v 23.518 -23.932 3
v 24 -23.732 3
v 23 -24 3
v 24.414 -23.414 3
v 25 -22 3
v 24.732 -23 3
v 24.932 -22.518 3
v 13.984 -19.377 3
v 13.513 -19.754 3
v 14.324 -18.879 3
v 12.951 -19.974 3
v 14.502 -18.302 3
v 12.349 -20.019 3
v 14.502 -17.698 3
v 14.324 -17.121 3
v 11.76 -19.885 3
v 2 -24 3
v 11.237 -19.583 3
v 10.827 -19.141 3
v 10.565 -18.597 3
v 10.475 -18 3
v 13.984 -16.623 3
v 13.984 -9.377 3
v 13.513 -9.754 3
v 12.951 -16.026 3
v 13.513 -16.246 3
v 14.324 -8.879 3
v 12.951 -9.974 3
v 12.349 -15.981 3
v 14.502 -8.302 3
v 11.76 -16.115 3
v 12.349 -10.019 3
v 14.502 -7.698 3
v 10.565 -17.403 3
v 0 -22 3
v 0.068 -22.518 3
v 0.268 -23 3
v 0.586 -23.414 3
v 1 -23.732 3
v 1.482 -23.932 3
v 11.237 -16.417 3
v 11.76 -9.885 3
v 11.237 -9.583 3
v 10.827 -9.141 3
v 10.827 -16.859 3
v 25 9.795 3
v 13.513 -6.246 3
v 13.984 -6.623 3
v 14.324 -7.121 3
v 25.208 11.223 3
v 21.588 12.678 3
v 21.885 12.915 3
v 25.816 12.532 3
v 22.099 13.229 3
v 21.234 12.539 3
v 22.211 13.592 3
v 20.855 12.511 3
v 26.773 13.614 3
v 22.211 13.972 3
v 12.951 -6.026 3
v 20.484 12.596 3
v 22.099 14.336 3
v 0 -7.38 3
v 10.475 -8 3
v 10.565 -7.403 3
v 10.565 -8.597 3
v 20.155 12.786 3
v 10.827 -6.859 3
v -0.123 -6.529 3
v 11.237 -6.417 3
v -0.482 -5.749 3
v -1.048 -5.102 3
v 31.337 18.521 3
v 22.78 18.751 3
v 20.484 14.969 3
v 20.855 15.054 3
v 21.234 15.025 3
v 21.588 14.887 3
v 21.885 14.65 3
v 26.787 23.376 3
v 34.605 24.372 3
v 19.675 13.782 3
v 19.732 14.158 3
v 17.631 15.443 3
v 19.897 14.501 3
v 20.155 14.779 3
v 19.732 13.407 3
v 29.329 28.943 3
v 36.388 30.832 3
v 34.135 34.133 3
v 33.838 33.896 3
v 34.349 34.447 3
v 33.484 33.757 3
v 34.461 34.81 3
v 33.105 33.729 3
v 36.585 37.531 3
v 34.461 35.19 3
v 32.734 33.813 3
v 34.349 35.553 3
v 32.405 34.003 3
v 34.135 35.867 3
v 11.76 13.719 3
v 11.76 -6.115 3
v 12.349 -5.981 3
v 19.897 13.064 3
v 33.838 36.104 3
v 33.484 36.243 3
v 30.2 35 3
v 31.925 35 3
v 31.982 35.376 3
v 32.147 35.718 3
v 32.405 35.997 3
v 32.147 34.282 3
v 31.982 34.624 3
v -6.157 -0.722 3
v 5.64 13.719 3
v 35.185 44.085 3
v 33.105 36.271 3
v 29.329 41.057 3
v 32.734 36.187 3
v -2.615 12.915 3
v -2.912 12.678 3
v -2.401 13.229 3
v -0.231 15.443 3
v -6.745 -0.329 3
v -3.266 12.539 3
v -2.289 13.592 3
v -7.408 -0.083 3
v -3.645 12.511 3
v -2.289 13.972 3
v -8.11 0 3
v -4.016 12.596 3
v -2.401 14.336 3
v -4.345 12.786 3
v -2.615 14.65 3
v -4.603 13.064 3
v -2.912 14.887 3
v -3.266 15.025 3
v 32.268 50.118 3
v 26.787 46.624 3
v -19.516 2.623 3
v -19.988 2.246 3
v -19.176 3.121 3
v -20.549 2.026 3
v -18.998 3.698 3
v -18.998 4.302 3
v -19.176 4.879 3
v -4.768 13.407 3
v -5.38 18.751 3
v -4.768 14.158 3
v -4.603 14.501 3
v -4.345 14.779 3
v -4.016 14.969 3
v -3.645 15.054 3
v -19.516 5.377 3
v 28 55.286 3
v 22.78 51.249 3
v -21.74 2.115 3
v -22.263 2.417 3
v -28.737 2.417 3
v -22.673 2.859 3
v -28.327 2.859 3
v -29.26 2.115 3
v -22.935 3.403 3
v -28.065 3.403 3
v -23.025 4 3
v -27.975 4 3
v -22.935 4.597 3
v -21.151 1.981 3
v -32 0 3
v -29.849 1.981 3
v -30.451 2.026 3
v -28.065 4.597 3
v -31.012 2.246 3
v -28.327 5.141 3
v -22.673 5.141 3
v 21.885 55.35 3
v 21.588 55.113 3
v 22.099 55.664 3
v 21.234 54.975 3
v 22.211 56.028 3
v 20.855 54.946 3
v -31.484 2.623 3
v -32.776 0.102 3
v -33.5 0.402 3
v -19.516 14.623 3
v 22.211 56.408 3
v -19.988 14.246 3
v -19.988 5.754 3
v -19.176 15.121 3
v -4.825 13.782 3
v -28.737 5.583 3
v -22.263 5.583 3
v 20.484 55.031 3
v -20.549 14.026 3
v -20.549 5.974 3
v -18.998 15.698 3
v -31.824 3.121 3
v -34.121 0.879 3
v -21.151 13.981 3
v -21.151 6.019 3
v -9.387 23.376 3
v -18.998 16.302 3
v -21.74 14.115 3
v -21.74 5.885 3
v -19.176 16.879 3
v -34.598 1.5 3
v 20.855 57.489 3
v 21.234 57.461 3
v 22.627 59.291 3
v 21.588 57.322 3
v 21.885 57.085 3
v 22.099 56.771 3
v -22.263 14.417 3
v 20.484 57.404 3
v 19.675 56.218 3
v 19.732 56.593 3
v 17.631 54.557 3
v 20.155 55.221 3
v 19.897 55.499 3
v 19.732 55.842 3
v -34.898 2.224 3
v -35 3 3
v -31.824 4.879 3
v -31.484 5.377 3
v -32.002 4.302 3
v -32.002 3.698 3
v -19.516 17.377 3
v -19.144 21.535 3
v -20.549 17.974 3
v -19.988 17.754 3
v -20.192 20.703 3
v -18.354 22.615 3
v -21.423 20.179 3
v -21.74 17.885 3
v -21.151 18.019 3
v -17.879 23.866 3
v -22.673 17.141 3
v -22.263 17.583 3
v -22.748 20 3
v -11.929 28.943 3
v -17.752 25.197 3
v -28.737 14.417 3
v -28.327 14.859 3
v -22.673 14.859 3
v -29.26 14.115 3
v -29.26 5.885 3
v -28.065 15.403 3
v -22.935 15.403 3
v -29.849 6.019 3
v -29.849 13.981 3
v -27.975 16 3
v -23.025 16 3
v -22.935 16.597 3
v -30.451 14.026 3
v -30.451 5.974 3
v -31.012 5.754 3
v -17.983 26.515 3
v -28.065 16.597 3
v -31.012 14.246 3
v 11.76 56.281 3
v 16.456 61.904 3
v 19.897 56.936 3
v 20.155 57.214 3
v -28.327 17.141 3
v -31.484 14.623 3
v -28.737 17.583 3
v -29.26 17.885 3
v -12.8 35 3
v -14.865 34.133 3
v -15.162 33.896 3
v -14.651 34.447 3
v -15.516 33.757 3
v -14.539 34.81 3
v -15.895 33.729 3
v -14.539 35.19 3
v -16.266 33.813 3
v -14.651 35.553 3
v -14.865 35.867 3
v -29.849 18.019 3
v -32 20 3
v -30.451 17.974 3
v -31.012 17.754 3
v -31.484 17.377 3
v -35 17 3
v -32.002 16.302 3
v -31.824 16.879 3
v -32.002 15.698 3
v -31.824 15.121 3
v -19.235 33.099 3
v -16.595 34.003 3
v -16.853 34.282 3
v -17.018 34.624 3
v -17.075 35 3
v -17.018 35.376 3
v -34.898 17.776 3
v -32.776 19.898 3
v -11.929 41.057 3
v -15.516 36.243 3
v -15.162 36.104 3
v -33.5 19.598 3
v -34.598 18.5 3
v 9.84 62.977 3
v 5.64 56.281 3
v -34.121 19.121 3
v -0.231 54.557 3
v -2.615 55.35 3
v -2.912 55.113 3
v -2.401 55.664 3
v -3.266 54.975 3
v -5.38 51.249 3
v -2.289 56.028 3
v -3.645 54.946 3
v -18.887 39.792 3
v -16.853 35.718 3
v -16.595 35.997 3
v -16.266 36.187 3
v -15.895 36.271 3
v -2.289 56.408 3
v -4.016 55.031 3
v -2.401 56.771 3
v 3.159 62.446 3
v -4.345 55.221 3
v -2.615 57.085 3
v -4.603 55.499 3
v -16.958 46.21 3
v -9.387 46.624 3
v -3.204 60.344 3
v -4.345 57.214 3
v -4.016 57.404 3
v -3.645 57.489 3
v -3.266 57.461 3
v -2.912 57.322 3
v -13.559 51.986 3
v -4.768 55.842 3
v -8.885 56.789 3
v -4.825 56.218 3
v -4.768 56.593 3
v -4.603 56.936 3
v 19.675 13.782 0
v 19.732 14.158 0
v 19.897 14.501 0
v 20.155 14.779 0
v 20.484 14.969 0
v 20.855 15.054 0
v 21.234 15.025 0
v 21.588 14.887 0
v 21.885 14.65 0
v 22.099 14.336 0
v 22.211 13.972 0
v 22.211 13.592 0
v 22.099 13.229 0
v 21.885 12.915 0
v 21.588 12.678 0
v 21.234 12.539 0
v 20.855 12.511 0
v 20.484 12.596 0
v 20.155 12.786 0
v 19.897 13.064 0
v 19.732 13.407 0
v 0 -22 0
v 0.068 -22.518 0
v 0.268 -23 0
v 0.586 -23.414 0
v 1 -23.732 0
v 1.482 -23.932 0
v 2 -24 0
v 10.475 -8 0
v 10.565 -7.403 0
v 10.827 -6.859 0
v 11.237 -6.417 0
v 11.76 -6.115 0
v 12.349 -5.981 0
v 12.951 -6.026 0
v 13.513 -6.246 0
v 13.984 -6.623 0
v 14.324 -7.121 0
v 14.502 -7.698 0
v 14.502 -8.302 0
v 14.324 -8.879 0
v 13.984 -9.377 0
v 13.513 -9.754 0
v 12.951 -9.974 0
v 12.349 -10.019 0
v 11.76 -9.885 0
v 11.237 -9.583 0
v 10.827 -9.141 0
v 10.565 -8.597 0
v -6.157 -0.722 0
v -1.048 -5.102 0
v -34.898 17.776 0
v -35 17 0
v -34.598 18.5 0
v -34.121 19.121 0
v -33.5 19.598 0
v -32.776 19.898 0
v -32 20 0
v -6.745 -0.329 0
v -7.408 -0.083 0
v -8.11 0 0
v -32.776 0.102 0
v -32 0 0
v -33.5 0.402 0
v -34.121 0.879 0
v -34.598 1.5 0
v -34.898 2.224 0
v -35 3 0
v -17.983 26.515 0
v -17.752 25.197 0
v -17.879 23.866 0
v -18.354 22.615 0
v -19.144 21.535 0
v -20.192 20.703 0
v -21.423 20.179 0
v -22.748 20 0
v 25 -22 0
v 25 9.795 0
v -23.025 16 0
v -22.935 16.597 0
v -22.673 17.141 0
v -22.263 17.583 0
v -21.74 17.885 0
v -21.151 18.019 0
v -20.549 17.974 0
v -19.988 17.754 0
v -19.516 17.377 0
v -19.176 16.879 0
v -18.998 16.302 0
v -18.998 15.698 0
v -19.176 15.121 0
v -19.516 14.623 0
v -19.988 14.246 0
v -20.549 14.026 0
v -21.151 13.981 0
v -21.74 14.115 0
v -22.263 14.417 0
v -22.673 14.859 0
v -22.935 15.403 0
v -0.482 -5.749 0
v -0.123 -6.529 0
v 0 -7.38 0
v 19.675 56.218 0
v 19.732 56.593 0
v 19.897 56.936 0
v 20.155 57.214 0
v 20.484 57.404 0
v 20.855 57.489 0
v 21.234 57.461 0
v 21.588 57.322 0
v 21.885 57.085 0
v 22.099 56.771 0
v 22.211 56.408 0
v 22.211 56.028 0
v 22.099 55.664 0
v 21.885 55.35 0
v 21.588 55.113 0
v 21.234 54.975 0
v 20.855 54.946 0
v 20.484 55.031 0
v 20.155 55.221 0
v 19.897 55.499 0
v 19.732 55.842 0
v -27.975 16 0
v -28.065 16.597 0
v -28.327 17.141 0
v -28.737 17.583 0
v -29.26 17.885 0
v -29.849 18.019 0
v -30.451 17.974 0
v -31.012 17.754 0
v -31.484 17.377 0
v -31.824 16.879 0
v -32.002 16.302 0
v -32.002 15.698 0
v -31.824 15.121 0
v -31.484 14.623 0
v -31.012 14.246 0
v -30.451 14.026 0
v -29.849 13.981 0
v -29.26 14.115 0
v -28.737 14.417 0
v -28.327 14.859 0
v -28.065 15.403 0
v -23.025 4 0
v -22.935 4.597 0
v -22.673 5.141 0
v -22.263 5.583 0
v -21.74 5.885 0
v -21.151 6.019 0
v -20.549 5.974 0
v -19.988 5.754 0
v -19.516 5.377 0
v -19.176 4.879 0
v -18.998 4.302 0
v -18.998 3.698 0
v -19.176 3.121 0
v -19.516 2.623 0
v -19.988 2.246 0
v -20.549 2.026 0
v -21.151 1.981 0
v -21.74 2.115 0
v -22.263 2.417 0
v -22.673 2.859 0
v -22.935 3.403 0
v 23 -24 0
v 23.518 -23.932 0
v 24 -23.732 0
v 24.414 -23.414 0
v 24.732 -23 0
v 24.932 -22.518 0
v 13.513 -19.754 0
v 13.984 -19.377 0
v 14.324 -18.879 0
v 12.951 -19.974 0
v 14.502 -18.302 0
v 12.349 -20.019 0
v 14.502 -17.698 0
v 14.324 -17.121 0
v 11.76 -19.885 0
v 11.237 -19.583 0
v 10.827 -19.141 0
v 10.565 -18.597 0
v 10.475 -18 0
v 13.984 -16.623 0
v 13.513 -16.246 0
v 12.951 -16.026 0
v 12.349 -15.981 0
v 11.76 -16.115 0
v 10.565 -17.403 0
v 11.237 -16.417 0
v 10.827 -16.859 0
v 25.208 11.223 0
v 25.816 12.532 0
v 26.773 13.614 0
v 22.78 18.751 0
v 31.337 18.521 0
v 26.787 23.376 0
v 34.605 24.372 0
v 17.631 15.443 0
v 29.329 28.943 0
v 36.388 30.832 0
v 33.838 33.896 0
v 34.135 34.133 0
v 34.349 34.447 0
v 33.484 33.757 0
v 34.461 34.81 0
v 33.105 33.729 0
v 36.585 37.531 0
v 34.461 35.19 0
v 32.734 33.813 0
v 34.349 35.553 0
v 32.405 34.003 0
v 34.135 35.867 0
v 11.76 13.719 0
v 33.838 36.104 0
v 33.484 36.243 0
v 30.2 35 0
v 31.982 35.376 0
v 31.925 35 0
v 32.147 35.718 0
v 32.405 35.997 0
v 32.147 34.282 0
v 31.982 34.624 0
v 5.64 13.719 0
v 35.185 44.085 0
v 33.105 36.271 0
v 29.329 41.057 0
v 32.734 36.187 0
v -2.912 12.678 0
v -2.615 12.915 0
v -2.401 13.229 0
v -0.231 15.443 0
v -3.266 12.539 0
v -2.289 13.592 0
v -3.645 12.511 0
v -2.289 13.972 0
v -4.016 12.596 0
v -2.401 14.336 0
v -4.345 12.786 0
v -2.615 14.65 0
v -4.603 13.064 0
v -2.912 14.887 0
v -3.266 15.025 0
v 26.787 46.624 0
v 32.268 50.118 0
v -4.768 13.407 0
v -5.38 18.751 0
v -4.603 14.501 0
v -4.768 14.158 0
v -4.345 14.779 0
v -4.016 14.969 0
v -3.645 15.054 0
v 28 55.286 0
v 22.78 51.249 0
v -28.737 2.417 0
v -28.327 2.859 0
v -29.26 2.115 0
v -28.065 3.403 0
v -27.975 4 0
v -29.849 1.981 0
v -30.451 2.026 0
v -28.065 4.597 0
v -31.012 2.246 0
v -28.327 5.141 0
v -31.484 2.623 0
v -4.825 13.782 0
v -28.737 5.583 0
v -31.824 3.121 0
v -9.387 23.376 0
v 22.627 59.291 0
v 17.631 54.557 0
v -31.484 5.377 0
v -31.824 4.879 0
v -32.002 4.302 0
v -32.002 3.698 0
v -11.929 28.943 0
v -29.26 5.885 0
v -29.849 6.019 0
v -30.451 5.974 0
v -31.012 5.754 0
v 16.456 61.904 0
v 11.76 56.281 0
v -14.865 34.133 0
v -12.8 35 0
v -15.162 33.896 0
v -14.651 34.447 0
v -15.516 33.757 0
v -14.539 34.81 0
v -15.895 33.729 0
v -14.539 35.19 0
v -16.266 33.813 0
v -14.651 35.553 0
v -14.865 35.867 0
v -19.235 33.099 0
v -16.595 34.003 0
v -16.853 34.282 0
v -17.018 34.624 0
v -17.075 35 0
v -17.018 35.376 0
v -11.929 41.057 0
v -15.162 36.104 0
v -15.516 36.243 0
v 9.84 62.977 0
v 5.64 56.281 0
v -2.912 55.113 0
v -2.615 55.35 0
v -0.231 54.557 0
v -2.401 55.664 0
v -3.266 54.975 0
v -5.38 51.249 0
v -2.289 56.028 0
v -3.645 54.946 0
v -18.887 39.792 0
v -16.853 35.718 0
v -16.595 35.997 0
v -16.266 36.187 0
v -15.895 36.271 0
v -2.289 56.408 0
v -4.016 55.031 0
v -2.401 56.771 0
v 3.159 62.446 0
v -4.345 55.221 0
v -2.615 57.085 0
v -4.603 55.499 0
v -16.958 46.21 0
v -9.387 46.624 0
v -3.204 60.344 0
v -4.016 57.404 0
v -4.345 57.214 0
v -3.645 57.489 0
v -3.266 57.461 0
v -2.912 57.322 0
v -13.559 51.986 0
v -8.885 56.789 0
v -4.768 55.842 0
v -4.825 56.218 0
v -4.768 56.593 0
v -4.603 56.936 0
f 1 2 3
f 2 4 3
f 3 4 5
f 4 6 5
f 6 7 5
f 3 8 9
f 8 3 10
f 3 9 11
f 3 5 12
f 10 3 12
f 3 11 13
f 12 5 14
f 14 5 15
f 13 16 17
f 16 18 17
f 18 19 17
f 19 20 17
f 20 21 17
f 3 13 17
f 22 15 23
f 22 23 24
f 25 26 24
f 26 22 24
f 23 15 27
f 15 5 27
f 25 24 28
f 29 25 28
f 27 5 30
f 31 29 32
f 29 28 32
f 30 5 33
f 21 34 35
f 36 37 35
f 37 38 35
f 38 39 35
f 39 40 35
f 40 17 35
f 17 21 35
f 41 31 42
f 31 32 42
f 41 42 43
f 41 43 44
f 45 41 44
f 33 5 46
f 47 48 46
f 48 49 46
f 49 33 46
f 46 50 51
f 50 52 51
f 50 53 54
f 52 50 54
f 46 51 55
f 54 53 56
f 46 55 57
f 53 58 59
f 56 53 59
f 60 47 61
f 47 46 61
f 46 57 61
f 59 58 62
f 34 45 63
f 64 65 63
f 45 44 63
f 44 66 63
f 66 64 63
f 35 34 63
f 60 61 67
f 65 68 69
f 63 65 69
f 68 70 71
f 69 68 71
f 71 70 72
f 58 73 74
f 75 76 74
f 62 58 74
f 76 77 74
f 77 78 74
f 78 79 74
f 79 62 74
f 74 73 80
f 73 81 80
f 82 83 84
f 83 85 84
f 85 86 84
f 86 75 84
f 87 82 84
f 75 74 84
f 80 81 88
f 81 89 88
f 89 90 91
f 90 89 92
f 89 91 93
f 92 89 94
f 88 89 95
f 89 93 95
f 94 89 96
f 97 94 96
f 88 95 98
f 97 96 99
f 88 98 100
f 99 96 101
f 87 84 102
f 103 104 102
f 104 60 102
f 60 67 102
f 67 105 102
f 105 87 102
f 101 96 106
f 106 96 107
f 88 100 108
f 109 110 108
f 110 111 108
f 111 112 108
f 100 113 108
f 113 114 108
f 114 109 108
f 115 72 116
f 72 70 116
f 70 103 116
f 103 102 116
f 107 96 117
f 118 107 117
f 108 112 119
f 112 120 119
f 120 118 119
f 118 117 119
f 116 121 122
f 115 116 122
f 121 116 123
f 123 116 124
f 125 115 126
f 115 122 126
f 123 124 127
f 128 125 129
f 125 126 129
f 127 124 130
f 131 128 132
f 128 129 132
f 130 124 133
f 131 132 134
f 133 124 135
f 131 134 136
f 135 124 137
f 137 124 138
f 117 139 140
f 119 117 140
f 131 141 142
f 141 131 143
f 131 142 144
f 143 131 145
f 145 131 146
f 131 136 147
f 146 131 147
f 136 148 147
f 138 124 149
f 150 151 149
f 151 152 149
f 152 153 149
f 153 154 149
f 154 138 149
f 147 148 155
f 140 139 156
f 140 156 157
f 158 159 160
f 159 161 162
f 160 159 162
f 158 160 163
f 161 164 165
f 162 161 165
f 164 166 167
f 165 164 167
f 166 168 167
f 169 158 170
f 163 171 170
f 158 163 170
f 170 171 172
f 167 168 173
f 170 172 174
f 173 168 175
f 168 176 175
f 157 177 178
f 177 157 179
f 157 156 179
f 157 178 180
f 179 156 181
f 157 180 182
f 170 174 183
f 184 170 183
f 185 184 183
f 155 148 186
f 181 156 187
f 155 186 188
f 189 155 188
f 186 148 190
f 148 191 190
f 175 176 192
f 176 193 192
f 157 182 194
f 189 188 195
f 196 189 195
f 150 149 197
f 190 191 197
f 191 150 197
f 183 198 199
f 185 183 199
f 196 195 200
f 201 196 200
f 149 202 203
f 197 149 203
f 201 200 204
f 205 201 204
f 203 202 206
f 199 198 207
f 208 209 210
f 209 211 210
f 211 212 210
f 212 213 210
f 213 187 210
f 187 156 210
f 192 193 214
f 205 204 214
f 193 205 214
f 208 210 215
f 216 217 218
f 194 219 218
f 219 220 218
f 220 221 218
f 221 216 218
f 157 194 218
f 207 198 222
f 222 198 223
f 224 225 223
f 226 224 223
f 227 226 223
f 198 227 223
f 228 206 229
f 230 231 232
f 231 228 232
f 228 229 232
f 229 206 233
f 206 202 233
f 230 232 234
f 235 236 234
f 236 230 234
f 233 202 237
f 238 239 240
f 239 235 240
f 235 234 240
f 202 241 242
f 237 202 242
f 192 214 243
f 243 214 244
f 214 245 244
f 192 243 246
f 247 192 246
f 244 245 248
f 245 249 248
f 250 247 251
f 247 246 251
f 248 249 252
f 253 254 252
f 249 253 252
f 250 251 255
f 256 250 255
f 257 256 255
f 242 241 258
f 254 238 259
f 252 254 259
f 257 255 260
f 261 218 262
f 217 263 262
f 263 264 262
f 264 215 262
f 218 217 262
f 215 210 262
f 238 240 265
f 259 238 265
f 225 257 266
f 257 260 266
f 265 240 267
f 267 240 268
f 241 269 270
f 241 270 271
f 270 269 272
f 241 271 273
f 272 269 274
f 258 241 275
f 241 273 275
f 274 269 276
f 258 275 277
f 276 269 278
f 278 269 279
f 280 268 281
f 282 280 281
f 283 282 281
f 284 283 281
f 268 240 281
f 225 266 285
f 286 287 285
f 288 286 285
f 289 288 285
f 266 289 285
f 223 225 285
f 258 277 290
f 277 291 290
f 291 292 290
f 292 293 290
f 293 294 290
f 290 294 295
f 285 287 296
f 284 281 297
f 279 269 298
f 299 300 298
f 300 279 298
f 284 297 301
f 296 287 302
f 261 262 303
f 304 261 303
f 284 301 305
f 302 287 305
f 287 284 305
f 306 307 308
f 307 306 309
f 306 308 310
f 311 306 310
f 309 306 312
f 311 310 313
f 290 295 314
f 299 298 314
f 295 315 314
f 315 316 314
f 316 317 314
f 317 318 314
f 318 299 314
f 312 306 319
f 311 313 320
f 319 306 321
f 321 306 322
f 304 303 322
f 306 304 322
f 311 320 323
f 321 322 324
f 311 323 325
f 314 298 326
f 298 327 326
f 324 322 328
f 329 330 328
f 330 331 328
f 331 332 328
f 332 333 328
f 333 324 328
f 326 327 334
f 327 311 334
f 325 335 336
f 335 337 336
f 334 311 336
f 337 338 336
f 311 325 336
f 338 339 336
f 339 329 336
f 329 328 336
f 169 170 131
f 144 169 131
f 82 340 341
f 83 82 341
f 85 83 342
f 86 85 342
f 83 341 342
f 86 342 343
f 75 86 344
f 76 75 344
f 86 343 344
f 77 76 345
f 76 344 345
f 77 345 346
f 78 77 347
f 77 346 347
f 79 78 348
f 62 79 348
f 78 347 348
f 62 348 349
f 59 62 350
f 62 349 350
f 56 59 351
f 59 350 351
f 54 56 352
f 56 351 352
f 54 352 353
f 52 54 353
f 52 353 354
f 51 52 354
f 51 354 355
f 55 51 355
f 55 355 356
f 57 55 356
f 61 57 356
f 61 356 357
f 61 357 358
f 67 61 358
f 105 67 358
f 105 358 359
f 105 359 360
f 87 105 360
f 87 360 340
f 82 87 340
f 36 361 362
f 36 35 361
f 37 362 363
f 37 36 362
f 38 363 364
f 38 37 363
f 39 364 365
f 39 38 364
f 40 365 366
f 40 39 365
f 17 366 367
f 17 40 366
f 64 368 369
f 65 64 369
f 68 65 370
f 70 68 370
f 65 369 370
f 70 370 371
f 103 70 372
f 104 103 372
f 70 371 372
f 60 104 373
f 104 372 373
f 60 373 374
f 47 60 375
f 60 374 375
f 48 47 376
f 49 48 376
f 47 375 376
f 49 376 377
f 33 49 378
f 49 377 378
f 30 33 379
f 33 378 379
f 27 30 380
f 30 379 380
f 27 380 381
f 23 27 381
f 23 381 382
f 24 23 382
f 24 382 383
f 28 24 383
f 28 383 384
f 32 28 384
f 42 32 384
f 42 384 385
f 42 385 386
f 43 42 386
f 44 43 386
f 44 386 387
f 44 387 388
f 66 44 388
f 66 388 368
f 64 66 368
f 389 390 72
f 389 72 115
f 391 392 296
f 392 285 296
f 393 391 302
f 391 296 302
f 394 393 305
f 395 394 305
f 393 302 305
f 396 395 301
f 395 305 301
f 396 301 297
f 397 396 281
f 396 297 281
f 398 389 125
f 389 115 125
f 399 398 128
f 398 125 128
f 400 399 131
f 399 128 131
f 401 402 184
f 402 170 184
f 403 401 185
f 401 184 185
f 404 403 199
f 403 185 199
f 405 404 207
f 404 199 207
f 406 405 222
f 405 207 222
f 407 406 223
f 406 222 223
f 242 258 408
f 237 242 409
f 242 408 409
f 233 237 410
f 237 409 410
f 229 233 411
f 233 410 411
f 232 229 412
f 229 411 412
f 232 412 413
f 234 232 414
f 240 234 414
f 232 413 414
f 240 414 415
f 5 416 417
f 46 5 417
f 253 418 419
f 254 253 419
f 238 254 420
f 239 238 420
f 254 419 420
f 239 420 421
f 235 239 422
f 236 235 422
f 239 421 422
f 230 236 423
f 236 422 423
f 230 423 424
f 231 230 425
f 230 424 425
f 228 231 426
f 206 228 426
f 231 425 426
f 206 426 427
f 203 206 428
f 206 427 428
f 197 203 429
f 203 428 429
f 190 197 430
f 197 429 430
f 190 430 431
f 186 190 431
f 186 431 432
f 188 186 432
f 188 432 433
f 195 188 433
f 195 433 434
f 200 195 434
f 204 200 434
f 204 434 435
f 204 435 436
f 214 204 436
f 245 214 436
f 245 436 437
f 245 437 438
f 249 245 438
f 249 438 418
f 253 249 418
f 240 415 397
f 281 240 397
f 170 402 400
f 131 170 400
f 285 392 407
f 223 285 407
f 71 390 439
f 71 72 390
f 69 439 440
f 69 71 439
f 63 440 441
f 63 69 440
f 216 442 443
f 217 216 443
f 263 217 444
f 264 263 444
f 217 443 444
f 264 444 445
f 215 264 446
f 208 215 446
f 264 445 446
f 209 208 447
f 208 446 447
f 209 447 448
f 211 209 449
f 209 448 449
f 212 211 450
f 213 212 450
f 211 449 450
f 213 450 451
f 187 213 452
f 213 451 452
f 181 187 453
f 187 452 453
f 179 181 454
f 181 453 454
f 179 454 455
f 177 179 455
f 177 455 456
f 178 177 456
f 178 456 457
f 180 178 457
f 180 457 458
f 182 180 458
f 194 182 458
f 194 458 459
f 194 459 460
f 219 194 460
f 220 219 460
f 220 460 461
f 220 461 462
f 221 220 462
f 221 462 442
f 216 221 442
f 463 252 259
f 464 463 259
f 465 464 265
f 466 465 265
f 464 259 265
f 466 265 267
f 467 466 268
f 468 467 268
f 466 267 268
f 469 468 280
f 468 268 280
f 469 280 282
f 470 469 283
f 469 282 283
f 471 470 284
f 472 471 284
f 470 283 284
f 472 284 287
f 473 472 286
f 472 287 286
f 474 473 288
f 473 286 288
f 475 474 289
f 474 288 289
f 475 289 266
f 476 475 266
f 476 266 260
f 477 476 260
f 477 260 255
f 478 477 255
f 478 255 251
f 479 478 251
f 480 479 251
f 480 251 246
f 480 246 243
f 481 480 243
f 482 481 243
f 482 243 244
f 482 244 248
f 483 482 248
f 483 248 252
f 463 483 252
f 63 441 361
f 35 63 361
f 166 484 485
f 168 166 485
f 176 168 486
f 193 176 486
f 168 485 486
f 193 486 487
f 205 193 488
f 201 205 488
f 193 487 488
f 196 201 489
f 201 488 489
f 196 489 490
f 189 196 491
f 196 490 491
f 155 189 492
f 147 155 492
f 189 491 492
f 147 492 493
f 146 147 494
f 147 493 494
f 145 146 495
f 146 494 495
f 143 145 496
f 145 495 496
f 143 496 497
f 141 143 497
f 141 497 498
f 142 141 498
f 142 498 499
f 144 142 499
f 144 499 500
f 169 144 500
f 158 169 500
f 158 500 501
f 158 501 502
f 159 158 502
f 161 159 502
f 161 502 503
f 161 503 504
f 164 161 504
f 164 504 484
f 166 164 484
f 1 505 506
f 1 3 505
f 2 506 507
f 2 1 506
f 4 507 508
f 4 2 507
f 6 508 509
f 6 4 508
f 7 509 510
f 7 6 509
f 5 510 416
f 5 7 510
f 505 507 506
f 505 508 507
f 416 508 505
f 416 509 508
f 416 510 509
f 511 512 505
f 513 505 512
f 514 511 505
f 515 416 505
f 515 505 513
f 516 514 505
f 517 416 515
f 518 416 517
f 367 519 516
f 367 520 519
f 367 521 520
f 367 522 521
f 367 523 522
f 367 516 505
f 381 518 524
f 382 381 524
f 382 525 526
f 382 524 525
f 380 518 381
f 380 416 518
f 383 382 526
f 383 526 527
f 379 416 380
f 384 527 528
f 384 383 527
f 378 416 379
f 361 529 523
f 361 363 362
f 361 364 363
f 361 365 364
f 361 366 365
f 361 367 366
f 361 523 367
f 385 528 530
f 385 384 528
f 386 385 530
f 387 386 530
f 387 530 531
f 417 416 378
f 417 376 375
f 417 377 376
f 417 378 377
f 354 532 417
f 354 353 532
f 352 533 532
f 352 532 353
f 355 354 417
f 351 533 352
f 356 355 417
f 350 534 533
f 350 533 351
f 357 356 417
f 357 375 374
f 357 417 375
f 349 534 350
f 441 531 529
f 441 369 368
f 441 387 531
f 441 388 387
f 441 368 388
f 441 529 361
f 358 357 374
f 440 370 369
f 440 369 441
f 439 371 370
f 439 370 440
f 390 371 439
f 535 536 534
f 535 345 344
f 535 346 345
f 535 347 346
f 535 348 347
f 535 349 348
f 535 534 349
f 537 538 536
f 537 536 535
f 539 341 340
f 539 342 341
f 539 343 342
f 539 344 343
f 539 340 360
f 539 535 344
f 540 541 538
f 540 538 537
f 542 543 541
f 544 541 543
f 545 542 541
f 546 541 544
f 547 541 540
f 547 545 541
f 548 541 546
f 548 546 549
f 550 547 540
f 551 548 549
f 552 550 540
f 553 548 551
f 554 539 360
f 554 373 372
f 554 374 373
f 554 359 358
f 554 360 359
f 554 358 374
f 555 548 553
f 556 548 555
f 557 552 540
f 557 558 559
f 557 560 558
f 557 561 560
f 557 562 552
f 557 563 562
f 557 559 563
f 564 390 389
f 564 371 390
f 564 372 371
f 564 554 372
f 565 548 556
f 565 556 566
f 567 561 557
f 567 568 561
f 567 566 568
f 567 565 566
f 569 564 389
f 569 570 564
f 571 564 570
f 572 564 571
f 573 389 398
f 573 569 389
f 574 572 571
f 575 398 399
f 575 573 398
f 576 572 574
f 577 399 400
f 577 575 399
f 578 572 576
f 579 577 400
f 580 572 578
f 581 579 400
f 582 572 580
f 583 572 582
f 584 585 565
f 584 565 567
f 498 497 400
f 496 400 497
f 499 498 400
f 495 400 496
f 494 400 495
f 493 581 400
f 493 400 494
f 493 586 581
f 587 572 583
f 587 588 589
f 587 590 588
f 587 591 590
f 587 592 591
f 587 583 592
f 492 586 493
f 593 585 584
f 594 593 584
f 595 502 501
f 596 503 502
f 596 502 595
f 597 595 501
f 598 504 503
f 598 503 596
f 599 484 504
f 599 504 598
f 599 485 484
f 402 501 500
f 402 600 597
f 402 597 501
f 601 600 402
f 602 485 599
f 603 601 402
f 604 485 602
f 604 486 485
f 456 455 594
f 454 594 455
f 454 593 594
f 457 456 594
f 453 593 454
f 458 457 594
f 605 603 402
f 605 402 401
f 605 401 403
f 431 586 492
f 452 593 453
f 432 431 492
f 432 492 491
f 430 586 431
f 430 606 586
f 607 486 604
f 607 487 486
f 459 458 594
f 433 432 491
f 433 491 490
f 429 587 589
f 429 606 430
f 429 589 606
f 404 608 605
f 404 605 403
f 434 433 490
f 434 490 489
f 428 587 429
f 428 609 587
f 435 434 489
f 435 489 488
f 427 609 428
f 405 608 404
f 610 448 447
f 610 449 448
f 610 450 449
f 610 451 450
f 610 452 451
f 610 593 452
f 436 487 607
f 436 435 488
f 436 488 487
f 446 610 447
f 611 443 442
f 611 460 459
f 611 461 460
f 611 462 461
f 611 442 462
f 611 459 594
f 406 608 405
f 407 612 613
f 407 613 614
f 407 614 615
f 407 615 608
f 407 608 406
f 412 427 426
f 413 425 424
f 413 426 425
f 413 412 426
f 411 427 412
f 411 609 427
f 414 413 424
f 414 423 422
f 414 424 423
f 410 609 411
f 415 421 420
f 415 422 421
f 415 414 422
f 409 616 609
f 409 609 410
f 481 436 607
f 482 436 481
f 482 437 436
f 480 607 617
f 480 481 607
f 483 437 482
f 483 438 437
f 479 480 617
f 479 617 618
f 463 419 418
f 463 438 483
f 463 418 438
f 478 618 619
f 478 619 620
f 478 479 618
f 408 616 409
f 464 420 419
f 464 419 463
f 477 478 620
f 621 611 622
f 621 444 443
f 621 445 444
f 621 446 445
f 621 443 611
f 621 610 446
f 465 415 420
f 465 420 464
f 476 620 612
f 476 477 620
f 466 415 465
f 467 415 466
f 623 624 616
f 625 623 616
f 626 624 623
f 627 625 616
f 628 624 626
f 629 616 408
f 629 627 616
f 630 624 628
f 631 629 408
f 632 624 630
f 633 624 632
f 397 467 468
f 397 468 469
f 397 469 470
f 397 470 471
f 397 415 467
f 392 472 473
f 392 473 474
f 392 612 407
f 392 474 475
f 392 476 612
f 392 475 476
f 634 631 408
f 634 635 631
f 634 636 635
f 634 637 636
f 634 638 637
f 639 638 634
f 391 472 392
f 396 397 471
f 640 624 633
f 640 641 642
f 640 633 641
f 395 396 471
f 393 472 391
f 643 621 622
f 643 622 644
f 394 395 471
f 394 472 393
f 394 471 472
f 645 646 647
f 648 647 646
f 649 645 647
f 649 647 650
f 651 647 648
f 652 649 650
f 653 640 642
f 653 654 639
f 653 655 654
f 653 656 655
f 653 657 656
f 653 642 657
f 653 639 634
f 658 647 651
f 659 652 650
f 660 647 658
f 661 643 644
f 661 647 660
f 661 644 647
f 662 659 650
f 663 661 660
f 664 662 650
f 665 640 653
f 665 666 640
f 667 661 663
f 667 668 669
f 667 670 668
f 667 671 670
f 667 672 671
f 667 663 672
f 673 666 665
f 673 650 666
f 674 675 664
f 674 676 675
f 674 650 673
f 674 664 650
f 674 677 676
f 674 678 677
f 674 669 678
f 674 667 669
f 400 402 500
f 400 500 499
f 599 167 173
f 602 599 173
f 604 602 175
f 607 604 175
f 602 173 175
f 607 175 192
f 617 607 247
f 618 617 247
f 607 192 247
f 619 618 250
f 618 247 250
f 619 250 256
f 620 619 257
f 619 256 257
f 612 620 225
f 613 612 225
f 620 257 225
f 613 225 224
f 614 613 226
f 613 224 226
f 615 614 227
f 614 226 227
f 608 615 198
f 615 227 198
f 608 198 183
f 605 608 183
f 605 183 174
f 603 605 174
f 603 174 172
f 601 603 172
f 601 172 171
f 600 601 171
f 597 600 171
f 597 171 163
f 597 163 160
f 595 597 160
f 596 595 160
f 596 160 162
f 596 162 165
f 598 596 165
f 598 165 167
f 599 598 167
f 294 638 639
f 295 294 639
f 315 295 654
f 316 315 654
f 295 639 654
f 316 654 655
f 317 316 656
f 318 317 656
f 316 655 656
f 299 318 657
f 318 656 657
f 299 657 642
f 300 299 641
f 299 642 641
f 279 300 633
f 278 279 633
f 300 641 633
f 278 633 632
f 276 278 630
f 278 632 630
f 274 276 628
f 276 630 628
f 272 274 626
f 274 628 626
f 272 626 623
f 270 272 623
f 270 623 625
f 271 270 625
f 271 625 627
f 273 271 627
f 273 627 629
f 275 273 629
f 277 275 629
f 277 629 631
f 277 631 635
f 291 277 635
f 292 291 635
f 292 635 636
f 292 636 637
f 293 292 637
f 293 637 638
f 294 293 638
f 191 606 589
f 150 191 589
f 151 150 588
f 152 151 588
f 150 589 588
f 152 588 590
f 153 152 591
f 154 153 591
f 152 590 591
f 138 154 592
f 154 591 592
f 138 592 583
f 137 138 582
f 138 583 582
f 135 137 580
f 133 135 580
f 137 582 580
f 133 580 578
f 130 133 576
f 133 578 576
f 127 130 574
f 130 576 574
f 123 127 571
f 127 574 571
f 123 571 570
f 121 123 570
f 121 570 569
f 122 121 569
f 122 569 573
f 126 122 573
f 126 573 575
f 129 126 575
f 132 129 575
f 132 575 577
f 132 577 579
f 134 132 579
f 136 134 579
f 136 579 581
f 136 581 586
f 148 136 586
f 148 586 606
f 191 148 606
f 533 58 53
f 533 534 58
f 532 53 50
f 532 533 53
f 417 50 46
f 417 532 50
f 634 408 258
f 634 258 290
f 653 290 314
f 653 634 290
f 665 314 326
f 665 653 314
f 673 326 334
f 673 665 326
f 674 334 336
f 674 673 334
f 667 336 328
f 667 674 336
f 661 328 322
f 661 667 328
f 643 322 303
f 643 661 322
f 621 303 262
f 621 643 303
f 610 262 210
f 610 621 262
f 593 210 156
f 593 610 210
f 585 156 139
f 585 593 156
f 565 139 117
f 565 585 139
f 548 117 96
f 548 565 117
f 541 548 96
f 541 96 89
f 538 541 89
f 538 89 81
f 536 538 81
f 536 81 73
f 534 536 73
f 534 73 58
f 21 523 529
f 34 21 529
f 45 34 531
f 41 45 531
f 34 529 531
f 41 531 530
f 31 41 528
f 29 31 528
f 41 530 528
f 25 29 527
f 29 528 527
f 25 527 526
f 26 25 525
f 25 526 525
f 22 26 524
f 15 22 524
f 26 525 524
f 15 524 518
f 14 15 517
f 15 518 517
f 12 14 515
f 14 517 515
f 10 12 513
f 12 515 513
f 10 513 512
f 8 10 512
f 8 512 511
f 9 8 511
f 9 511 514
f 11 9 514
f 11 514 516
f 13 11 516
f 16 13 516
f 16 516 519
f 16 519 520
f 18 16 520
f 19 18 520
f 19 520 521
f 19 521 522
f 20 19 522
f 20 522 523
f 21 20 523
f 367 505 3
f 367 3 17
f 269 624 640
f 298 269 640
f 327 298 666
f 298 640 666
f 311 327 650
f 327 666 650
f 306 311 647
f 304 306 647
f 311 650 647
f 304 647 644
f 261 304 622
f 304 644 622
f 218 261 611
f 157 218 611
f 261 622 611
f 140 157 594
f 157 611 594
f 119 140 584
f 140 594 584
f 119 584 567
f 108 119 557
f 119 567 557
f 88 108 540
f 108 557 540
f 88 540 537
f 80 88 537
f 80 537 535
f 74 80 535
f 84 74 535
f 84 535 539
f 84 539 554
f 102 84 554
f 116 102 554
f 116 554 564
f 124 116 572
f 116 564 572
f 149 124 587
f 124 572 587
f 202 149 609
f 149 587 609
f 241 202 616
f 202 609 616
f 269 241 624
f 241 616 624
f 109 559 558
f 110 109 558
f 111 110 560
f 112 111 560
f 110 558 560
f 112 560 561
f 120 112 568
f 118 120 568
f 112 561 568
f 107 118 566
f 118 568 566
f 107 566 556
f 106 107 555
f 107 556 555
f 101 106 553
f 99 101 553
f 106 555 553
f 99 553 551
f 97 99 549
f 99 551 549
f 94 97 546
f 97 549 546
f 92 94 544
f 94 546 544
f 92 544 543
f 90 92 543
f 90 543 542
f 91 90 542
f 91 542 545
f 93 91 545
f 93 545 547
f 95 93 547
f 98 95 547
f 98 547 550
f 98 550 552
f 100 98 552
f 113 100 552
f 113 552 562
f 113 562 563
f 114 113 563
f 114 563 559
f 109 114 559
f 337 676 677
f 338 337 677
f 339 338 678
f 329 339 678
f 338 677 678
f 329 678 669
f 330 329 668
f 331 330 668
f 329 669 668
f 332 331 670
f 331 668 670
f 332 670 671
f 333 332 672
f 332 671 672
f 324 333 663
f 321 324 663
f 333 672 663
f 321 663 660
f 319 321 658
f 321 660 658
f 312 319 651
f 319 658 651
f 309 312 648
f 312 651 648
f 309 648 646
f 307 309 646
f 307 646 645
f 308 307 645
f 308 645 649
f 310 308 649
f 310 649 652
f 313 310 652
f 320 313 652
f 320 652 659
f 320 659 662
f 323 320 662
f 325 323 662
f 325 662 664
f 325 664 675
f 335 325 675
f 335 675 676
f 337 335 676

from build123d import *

# Parameters (mm, degrees)
EXTRUDE_1_DEPTH          = 3
SKETCH_2_R               = 28
EXTRUDE_2_DEPTH          = 3
SKETCH_3_R               = 21.5
CUT_EXTRUDE_1_DEPTH      = 3
FILLET_2_R               = 5
SKETCH_4_R               = 1.275
CUT_EXTRUDE_2_DEPTH      = 4
SKETCH_5_R               = 2.025
CUT_EXTRUDE_3_DEPTH      = 4
SKETCH_6_W               = 25
SKETCH_6_H               = 6
CUT_EXTRUDE_4_DEPTH      = 4
FILLET_3_R               = 2
SKETCH_8_R               = 2.025
CUT_EXTRUDE_5_DEPTH      = 10
SKETCH_9_R               = 2.025
CUT_EXTRUDE_6_DEPTH      = 1
CUT_EXTRUDE_6_DEPTH_BACK = 4
EXTRUDE_3_DEPTH          = 3
FILLET_4_R               = 3


with BuildPart() as part:
    # 草图1 → 凸台-拉伸1 (new body)
    with BuildSketch(Plane.XY):
        Polygon((-35, 0), (0, 0), (0, -30), (25, -30), (25, 20), (-35, 20), align=None)
    extrude(amount=EXTRUDE_1_DEPTH)

    # 草图2 → 凸台-拉伸2 (add)
    with BuildSketch(Plane(origin=(0, 0, 0), x_dir=(-1, 0, 0), z_dir=(0, 0, -1))):
        with Locations((-8.7, 35)):
            Circle(SKETCH_2_R)
    extrude(amount=-EXTRUDE_2_DEPTH)

    # 草图3 → 切除-拉伸1 (cut)
    with BuildSketch(Plane(origin=(0, 0, 0), x_dir=(-1, 0, 0), z_dir=(0, 0, -1))):
        with Locations((-8.7, 35)):
            Circle(SKETCH_3_R)
    extrude(amount=-CUT_EXTRUDE_1_DEPTH, mode=Mode.SUBTRACT)

    # 圆角2
    fillet_2_edges = [part.edges().sort_by_distance(p)[0] for p in [
        (25, 12.233577356, 1.5),
        (-14.943180835, 20, 1.5),
    ]]
    fillet(fillet_2_edges, radius=FILLET_2_R)

    # 草图4 → 切除-拉伸2 (cut, through all)
    with BuildSketch(Plane(origin=(0, 0, 0), x_dir=(-1, 0, 0), z_dir=(0, 0, -1))):
        with Locations((-33.2, 35)):
            Circle(SKETCH_4_R)
        with Locations((-20.95, 56.217622393)):
            Circle(SKETCH_4_R)
        with Locations((3.55, 56.217622393)):
            Circle(SKETCH_4_R)
        with Locations((15.8, 35)):
            Circle(SKETCH_4_R)
        with Locations((3.55, 13.782377607)):
            Circle(SKETCH_4_R)
        with Locations((-20.95, 13.782377607)):
            Circle(SKETCH_4_R)
    extrude(amount=-CUT_EXTRUDE_2_DEPTH, mode=Mode.SUBTRACT)

    # 草图5 → 切除-拉伸3 (cut, through all)
    with BuildSketch(Plane(origin=(0, 0, 0), x_dir=(-1, 0, 0), z_dir=(0, 0, -1))):
        with Locations((-12.5, -8)):
            Circle(SKETCH_5_R)
        with Locations((-12.5, -18)):
            Circle(SKETCH_5_R)
    extrude(amount=-CUT_EXTRUDE_3_DEPTH, mode=Mode.SUBTRACT)

    # 草图6 → 切除-拉伸4 (cut, through all)
    with BuildSketch(Plane(origin=(0, 0, 0), x_dir=(-1, 0, 0), z_dir=(0, 0, -1))):
        with Locations((-12.5, -27)):
            Rectangle(SKETCH_6_W, SKETCH_6_H)
    extrude(amount=-CUT_EXTRUDE_4_DEPTH, mode=Mode.SUBTRACT)

    # 圆角3
    fillet_3_edges = [part.edges().sort_by_distance(p)[0] for p in [
        (25, -24, 1.5),
        (0, -24, 1.5),
    ]]
    fillet(fillet_3_edges, radius=FILLET_3_R)

    # 草图8 → 切除-拉伸5 (cut)
    with BuildSketch(Plane.XY.offset(3)):
        with Locations((-30, 16)):
            Circle(SKETCH_8_R)
        with Locations((-30, 4)):
            Circle(SKETCH_8_R)
    extrude(amount=-CUT_EXTRUDE_5_DEPTH, mode=Mode.SUBTRACT)

    # 草图9 → 切除-拉伸6 (cut, two sides)
    with BuildSketch(Plane(origin=(0, 0, 0), x_dir=(-1, 0, 0), z_dir=(0, 0, -1))) as cut_extrude_6_sk:
        with Locations((21, 4)):
            Circle(SKETCH_9_R)
        with Locations((21, 16)):
            Circle(SKETCH_9_R)
    extrude(amount=CUT_EXTRUDE_6_DEPTH, mode=Mode.SUBTRACT)
    extrude(cut_extrude_6_sk.sketch, amount=-CUT_EXTRUDE_6_DEPTH_BACK, mode=Mode.SUBTRACT)

    # 草图10 → 凸台-拉伸3 (add)
    with BuildSketch(Plane(origin=(0, 0, 0), x_dir=(-1, 0, 0), z_dir=(0, 0, -1))):
        Polygon((0, -6), (7, 0), (0, 0), align=None)
    extrude(amount=-EXTRUDE_3_DEPTH)

    # 圆角4
    fillet_4_edges = [part.edges().sort_by_distance(p)[0] for p in [
        (-35, 20, 1.5),
        (-35, 0, 1.5),
        (-7, 0, 1.5),
        (0, -6, 1.5),
    ]]
    fillet(fillet_4_edges, radius=FILLET_4_R)


solid = part.part
